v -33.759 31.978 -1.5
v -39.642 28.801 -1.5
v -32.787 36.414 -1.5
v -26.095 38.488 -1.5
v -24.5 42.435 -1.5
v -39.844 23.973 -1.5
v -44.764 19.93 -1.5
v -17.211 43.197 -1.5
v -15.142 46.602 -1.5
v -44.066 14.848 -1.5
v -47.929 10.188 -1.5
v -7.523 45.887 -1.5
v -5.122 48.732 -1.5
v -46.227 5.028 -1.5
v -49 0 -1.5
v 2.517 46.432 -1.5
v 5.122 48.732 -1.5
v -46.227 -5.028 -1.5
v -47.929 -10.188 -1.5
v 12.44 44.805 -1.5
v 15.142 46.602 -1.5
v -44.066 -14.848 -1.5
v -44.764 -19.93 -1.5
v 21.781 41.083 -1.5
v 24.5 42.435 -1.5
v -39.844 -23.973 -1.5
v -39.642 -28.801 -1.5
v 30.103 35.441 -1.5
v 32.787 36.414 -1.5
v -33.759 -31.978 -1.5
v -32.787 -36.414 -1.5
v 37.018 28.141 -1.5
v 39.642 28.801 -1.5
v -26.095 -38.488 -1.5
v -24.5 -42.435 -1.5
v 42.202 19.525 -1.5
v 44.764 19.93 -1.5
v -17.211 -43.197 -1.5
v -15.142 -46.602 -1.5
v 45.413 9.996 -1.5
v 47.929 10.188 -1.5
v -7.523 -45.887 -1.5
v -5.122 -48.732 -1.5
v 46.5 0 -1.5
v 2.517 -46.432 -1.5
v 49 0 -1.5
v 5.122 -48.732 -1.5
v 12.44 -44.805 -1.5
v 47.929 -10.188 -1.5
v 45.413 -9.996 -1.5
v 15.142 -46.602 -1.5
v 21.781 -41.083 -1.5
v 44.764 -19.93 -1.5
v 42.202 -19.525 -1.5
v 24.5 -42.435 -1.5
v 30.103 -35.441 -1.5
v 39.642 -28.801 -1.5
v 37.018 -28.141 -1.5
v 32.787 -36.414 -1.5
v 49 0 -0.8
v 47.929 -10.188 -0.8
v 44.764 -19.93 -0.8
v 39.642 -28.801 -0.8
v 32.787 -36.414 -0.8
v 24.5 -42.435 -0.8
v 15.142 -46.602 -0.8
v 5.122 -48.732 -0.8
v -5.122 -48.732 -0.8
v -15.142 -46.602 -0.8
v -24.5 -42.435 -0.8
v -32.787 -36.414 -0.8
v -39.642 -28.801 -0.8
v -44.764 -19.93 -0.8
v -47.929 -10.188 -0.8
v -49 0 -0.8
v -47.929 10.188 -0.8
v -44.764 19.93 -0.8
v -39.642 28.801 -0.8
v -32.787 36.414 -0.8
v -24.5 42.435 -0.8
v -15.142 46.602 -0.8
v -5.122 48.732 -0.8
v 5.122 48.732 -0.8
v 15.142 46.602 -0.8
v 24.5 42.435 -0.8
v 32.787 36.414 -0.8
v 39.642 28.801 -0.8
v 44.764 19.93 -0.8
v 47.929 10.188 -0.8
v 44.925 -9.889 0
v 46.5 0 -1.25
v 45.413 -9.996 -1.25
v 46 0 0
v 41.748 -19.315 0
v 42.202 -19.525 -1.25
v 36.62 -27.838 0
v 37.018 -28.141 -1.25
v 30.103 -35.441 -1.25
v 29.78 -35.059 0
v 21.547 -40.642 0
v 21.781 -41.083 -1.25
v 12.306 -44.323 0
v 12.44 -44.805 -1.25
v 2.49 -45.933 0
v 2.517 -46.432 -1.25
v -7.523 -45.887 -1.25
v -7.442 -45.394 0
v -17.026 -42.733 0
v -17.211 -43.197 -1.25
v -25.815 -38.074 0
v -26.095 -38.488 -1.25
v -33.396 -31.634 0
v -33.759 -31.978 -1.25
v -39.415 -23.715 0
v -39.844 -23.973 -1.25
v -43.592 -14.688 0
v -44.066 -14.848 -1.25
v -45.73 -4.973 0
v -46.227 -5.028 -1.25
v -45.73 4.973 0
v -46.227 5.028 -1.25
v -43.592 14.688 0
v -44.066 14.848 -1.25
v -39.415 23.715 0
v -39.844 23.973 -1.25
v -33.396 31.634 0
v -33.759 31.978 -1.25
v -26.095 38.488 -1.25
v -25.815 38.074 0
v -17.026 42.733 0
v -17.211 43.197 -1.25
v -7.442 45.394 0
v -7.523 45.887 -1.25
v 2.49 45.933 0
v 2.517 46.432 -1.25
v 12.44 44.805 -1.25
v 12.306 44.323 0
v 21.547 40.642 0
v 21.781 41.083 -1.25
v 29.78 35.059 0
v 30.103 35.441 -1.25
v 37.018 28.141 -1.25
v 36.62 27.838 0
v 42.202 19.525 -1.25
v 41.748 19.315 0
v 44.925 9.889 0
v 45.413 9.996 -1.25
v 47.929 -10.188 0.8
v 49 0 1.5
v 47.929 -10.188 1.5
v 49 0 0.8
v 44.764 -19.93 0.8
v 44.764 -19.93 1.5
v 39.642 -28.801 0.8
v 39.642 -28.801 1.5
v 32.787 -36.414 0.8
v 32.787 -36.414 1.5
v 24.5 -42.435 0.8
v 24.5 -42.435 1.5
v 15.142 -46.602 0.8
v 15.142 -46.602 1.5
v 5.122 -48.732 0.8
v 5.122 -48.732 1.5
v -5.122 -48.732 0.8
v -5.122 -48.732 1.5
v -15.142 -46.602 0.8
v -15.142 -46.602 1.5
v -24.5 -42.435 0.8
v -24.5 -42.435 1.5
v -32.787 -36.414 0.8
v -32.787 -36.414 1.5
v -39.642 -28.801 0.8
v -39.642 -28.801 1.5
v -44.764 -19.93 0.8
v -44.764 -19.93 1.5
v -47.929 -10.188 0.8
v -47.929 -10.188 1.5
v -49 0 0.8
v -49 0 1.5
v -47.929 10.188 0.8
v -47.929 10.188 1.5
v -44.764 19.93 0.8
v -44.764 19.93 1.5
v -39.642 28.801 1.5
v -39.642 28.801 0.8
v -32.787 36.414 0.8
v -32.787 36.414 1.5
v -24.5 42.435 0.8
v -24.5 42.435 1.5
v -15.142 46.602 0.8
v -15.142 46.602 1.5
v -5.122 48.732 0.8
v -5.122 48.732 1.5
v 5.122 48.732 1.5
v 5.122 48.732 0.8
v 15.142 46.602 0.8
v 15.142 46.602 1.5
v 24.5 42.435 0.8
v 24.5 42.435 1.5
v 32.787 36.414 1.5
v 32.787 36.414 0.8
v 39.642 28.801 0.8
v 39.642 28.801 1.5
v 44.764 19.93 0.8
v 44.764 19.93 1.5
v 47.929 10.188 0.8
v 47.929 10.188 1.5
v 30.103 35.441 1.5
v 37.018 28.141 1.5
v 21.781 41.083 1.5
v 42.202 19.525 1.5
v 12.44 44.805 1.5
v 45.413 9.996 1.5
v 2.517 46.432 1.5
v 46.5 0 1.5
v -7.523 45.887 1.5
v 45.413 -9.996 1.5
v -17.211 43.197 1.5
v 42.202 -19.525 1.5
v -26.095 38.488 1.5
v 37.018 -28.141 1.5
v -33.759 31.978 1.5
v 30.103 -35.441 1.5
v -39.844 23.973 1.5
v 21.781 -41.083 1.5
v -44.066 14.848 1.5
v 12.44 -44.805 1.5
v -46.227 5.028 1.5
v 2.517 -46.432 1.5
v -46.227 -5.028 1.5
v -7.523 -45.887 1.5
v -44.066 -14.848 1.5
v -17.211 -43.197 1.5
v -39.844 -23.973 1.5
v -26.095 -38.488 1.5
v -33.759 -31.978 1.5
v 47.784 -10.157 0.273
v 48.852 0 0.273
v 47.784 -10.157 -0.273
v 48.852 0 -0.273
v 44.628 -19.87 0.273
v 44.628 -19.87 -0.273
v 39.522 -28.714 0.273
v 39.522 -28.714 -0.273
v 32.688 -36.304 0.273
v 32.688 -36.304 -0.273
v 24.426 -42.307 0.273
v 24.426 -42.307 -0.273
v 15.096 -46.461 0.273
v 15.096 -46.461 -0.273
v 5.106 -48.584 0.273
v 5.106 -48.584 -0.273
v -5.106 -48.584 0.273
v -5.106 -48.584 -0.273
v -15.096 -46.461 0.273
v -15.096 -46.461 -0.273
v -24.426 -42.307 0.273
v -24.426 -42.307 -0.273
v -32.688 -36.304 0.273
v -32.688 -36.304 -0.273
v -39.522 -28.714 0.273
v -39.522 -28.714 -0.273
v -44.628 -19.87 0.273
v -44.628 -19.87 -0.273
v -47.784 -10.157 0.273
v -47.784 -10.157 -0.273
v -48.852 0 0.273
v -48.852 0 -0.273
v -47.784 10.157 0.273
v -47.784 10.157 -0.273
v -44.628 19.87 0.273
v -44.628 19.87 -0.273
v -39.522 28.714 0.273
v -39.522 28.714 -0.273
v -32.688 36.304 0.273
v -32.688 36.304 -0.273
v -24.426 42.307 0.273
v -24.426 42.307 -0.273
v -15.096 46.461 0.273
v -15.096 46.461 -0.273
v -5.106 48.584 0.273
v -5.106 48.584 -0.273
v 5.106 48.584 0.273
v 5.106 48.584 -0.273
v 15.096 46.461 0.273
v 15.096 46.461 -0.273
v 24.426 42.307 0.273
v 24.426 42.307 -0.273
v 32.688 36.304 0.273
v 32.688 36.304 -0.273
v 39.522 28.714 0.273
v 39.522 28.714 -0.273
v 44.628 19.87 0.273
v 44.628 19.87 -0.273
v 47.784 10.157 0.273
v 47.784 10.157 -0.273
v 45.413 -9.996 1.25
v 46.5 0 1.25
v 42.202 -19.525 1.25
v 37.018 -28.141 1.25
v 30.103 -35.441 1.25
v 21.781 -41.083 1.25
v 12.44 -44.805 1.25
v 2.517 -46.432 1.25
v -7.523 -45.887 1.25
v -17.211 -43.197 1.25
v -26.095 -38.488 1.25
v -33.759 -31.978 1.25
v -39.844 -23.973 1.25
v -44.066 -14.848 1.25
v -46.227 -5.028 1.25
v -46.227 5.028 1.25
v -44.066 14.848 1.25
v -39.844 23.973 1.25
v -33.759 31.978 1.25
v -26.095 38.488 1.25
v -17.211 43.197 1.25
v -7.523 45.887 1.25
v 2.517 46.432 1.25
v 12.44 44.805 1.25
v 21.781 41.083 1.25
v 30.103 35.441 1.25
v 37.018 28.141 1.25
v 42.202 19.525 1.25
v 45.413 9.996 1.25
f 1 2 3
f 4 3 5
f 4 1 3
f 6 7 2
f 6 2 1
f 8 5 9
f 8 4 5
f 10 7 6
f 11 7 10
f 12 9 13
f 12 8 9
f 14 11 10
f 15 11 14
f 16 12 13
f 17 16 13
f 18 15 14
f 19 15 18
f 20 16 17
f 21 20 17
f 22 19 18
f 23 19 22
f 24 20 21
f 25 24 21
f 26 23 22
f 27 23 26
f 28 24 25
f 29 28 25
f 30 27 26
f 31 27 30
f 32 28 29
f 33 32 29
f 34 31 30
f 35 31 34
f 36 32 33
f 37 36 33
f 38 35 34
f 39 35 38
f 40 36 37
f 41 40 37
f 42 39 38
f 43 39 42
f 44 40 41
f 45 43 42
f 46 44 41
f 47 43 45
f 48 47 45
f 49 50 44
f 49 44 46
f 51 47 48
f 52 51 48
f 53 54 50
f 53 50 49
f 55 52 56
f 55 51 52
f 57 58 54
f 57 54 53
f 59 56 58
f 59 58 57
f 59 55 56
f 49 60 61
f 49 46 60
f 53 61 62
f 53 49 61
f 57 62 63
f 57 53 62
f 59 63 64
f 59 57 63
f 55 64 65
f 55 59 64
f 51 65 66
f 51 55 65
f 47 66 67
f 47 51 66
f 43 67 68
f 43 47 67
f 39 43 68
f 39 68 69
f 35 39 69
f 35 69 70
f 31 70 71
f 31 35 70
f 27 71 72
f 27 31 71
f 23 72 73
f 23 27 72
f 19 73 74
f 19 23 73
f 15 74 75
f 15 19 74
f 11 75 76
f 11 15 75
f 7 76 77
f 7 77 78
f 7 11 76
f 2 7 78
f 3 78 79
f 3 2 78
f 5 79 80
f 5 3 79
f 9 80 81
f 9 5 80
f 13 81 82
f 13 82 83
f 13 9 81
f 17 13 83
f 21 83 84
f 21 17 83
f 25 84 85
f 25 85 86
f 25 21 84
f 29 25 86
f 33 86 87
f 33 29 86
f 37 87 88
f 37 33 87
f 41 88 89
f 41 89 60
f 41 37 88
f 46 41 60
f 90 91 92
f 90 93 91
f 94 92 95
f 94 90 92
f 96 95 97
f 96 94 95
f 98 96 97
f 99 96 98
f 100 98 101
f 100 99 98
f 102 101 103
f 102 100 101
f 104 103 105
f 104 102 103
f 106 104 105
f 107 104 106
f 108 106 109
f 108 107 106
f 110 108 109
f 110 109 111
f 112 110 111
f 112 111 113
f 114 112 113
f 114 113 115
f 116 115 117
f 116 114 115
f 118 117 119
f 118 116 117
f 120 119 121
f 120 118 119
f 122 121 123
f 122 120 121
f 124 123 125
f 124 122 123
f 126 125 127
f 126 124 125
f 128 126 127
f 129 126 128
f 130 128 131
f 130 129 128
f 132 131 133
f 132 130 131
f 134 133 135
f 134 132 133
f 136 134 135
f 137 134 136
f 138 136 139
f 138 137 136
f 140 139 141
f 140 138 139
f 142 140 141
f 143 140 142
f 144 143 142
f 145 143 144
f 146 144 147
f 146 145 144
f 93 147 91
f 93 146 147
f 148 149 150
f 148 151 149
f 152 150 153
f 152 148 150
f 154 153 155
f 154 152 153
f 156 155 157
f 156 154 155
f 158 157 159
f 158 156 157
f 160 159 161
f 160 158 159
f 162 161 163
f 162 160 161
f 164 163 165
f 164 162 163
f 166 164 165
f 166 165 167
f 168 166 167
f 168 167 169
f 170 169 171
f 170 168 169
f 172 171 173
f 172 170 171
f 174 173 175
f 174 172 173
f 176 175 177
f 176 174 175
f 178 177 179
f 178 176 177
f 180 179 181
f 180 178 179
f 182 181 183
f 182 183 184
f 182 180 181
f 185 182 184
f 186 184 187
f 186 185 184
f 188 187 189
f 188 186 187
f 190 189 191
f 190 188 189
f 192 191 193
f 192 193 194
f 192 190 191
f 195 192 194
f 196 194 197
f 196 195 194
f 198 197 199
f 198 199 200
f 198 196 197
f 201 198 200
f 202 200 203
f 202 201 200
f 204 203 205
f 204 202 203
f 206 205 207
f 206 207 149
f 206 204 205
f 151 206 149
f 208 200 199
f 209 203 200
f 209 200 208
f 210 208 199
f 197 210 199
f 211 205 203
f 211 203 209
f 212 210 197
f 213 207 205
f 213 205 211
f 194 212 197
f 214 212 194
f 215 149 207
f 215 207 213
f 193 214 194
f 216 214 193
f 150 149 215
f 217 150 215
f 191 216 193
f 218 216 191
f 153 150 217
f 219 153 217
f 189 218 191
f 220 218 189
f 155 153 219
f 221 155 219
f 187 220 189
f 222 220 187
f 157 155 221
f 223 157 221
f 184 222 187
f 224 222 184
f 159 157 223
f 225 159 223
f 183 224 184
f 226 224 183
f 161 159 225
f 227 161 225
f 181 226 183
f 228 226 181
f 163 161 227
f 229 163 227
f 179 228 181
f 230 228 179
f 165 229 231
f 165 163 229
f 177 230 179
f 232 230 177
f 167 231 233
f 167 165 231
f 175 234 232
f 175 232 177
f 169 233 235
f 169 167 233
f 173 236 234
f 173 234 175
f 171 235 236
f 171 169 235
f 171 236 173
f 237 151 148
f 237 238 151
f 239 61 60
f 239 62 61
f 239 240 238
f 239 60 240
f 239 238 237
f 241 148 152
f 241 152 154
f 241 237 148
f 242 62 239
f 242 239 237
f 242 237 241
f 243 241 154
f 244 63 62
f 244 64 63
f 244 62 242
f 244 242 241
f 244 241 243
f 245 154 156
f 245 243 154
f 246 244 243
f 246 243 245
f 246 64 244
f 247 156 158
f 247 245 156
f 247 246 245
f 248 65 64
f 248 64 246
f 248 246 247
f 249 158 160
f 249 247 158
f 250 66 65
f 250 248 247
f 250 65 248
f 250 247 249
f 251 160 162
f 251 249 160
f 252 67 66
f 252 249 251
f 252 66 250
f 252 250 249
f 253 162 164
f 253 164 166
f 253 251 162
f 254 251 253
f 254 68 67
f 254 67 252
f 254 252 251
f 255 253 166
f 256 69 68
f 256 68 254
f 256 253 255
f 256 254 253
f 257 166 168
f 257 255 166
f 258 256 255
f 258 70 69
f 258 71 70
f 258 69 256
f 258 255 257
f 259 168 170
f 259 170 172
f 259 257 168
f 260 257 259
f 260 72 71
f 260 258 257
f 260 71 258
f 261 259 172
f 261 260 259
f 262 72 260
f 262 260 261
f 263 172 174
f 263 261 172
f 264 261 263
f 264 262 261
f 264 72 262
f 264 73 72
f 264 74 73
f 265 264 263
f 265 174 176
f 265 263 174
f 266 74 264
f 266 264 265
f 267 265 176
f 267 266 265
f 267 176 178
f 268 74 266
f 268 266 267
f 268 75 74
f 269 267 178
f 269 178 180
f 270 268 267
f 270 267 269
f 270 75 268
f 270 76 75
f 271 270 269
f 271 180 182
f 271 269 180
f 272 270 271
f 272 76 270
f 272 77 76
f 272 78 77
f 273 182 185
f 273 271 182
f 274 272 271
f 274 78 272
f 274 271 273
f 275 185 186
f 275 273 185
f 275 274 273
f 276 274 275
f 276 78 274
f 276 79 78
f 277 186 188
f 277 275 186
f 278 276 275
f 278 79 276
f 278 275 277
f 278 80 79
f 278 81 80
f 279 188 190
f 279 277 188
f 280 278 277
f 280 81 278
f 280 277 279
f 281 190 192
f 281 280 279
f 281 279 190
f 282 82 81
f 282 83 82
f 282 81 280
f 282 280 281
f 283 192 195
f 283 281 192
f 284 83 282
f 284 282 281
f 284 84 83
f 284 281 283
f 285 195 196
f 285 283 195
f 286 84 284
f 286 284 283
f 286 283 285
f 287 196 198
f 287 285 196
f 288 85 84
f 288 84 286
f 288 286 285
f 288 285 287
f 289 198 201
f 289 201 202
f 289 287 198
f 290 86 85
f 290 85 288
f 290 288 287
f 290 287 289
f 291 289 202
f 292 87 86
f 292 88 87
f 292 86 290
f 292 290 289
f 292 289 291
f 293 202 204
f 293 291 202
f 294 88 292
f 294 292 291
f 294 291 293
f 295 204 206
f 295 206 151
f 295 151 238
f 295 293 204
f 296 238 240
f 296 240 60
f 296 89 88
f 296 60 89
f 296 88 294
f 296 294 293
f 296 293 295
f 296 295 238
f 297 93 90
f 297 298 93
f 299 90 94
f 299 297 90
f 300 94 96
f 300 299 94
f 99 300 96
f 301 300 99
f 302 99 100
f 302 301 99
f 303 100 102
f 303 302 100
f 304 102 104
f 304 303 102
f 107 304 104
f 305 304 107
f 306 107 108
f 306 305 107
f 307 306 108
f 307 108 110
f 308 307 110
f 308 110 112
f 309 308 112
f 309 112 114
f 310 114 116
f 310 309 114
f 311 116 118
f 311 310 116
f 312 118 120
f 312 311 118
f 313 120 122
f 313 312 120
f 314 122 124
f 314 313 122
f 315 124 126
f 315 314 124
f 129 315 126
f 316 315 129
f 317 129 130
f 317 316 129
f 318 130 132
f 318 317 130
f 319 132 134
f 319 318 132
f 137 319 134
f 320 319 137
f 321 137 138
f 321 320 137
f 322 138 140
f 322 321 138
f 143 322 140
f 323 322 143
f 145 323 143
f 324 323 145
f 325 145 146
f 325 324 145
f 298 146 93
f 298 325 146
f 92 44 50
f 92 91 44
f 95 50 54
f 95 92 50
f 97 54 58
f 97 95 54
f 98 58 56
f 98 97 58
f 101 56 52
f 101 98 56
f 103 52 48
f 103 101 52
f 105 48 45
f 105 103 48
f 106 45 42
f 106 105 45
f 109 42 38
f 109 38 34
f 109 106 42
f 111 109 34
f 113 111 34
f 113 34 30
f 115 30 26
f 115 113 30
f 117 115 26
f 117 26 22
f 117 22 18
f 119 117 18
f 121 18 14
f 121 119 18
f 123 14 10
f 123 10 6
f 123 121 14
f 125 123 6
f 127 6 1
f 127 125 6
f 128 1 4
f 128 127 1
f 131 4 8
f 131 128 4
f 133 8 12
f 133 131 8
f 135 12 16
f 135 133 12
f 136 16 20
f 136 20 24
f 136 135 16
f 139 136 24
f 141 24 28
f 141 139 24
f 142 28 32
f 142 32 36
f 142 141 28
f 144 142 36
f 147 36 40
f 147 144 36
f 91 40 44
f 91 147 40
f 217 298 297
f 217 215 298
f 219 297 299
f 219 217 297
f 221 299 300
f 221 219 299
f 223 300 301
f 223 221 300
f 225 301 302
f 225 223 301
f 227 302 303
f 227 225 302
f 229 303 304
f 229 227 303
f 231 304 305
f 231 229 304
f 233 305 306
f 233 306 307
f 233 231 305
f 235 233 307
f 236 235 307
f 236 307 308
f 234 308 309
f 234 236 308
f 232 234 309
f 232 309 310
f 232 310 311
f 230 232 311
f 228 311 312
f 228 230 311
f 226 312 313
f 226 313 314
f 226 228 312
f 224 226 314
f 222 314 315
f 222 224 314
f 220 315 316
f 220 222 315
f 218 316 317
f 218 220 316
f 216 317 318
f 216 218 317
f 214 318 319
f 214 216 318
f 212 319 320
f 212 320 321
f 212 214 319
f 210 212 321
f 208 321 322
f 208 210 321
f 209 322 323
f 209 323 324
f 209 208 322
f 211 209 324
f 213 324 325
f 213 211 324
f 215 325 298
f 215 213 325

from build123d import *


with BuildPart() as part:
    # Sketch1 → Revolve1 (revolve)
    with BuildSketch(Plane(origin=(0, 0, 0), x_dir=(0, 0, -1), z_dir=(1, 0, 0)), mode=Mode.PRIVATE) as revolve1_sk:
        with BuildLine():
            Line((0.8, 49), (1.5, 49))
            Line((1.5, 49), (1.5, 46.5))
            Line((1.5, 46.5), (1.25, 46.5))
            Line((1.25, 46.5), (0, 46))
            Line((0, 46), (-1.25, 46.5))
            Line((-1.25, 46.5), (-1.5, 46.5))
            Line((-1.5, 46.5), (-1.5, 49))
            Line((-1.5, 49), (-0.8, 49))
            ThreePointArc((-0.8, 49), (0, 48.833030278), (0.8, 49))
        make_face()
    revolve(revolve1_sk.sketch.rotate(Axis((0, 0, 0), (0, 0, -1)), 90), axis=Axis((0, 0, 0), (0, 0, -1)))


solid = part.part
